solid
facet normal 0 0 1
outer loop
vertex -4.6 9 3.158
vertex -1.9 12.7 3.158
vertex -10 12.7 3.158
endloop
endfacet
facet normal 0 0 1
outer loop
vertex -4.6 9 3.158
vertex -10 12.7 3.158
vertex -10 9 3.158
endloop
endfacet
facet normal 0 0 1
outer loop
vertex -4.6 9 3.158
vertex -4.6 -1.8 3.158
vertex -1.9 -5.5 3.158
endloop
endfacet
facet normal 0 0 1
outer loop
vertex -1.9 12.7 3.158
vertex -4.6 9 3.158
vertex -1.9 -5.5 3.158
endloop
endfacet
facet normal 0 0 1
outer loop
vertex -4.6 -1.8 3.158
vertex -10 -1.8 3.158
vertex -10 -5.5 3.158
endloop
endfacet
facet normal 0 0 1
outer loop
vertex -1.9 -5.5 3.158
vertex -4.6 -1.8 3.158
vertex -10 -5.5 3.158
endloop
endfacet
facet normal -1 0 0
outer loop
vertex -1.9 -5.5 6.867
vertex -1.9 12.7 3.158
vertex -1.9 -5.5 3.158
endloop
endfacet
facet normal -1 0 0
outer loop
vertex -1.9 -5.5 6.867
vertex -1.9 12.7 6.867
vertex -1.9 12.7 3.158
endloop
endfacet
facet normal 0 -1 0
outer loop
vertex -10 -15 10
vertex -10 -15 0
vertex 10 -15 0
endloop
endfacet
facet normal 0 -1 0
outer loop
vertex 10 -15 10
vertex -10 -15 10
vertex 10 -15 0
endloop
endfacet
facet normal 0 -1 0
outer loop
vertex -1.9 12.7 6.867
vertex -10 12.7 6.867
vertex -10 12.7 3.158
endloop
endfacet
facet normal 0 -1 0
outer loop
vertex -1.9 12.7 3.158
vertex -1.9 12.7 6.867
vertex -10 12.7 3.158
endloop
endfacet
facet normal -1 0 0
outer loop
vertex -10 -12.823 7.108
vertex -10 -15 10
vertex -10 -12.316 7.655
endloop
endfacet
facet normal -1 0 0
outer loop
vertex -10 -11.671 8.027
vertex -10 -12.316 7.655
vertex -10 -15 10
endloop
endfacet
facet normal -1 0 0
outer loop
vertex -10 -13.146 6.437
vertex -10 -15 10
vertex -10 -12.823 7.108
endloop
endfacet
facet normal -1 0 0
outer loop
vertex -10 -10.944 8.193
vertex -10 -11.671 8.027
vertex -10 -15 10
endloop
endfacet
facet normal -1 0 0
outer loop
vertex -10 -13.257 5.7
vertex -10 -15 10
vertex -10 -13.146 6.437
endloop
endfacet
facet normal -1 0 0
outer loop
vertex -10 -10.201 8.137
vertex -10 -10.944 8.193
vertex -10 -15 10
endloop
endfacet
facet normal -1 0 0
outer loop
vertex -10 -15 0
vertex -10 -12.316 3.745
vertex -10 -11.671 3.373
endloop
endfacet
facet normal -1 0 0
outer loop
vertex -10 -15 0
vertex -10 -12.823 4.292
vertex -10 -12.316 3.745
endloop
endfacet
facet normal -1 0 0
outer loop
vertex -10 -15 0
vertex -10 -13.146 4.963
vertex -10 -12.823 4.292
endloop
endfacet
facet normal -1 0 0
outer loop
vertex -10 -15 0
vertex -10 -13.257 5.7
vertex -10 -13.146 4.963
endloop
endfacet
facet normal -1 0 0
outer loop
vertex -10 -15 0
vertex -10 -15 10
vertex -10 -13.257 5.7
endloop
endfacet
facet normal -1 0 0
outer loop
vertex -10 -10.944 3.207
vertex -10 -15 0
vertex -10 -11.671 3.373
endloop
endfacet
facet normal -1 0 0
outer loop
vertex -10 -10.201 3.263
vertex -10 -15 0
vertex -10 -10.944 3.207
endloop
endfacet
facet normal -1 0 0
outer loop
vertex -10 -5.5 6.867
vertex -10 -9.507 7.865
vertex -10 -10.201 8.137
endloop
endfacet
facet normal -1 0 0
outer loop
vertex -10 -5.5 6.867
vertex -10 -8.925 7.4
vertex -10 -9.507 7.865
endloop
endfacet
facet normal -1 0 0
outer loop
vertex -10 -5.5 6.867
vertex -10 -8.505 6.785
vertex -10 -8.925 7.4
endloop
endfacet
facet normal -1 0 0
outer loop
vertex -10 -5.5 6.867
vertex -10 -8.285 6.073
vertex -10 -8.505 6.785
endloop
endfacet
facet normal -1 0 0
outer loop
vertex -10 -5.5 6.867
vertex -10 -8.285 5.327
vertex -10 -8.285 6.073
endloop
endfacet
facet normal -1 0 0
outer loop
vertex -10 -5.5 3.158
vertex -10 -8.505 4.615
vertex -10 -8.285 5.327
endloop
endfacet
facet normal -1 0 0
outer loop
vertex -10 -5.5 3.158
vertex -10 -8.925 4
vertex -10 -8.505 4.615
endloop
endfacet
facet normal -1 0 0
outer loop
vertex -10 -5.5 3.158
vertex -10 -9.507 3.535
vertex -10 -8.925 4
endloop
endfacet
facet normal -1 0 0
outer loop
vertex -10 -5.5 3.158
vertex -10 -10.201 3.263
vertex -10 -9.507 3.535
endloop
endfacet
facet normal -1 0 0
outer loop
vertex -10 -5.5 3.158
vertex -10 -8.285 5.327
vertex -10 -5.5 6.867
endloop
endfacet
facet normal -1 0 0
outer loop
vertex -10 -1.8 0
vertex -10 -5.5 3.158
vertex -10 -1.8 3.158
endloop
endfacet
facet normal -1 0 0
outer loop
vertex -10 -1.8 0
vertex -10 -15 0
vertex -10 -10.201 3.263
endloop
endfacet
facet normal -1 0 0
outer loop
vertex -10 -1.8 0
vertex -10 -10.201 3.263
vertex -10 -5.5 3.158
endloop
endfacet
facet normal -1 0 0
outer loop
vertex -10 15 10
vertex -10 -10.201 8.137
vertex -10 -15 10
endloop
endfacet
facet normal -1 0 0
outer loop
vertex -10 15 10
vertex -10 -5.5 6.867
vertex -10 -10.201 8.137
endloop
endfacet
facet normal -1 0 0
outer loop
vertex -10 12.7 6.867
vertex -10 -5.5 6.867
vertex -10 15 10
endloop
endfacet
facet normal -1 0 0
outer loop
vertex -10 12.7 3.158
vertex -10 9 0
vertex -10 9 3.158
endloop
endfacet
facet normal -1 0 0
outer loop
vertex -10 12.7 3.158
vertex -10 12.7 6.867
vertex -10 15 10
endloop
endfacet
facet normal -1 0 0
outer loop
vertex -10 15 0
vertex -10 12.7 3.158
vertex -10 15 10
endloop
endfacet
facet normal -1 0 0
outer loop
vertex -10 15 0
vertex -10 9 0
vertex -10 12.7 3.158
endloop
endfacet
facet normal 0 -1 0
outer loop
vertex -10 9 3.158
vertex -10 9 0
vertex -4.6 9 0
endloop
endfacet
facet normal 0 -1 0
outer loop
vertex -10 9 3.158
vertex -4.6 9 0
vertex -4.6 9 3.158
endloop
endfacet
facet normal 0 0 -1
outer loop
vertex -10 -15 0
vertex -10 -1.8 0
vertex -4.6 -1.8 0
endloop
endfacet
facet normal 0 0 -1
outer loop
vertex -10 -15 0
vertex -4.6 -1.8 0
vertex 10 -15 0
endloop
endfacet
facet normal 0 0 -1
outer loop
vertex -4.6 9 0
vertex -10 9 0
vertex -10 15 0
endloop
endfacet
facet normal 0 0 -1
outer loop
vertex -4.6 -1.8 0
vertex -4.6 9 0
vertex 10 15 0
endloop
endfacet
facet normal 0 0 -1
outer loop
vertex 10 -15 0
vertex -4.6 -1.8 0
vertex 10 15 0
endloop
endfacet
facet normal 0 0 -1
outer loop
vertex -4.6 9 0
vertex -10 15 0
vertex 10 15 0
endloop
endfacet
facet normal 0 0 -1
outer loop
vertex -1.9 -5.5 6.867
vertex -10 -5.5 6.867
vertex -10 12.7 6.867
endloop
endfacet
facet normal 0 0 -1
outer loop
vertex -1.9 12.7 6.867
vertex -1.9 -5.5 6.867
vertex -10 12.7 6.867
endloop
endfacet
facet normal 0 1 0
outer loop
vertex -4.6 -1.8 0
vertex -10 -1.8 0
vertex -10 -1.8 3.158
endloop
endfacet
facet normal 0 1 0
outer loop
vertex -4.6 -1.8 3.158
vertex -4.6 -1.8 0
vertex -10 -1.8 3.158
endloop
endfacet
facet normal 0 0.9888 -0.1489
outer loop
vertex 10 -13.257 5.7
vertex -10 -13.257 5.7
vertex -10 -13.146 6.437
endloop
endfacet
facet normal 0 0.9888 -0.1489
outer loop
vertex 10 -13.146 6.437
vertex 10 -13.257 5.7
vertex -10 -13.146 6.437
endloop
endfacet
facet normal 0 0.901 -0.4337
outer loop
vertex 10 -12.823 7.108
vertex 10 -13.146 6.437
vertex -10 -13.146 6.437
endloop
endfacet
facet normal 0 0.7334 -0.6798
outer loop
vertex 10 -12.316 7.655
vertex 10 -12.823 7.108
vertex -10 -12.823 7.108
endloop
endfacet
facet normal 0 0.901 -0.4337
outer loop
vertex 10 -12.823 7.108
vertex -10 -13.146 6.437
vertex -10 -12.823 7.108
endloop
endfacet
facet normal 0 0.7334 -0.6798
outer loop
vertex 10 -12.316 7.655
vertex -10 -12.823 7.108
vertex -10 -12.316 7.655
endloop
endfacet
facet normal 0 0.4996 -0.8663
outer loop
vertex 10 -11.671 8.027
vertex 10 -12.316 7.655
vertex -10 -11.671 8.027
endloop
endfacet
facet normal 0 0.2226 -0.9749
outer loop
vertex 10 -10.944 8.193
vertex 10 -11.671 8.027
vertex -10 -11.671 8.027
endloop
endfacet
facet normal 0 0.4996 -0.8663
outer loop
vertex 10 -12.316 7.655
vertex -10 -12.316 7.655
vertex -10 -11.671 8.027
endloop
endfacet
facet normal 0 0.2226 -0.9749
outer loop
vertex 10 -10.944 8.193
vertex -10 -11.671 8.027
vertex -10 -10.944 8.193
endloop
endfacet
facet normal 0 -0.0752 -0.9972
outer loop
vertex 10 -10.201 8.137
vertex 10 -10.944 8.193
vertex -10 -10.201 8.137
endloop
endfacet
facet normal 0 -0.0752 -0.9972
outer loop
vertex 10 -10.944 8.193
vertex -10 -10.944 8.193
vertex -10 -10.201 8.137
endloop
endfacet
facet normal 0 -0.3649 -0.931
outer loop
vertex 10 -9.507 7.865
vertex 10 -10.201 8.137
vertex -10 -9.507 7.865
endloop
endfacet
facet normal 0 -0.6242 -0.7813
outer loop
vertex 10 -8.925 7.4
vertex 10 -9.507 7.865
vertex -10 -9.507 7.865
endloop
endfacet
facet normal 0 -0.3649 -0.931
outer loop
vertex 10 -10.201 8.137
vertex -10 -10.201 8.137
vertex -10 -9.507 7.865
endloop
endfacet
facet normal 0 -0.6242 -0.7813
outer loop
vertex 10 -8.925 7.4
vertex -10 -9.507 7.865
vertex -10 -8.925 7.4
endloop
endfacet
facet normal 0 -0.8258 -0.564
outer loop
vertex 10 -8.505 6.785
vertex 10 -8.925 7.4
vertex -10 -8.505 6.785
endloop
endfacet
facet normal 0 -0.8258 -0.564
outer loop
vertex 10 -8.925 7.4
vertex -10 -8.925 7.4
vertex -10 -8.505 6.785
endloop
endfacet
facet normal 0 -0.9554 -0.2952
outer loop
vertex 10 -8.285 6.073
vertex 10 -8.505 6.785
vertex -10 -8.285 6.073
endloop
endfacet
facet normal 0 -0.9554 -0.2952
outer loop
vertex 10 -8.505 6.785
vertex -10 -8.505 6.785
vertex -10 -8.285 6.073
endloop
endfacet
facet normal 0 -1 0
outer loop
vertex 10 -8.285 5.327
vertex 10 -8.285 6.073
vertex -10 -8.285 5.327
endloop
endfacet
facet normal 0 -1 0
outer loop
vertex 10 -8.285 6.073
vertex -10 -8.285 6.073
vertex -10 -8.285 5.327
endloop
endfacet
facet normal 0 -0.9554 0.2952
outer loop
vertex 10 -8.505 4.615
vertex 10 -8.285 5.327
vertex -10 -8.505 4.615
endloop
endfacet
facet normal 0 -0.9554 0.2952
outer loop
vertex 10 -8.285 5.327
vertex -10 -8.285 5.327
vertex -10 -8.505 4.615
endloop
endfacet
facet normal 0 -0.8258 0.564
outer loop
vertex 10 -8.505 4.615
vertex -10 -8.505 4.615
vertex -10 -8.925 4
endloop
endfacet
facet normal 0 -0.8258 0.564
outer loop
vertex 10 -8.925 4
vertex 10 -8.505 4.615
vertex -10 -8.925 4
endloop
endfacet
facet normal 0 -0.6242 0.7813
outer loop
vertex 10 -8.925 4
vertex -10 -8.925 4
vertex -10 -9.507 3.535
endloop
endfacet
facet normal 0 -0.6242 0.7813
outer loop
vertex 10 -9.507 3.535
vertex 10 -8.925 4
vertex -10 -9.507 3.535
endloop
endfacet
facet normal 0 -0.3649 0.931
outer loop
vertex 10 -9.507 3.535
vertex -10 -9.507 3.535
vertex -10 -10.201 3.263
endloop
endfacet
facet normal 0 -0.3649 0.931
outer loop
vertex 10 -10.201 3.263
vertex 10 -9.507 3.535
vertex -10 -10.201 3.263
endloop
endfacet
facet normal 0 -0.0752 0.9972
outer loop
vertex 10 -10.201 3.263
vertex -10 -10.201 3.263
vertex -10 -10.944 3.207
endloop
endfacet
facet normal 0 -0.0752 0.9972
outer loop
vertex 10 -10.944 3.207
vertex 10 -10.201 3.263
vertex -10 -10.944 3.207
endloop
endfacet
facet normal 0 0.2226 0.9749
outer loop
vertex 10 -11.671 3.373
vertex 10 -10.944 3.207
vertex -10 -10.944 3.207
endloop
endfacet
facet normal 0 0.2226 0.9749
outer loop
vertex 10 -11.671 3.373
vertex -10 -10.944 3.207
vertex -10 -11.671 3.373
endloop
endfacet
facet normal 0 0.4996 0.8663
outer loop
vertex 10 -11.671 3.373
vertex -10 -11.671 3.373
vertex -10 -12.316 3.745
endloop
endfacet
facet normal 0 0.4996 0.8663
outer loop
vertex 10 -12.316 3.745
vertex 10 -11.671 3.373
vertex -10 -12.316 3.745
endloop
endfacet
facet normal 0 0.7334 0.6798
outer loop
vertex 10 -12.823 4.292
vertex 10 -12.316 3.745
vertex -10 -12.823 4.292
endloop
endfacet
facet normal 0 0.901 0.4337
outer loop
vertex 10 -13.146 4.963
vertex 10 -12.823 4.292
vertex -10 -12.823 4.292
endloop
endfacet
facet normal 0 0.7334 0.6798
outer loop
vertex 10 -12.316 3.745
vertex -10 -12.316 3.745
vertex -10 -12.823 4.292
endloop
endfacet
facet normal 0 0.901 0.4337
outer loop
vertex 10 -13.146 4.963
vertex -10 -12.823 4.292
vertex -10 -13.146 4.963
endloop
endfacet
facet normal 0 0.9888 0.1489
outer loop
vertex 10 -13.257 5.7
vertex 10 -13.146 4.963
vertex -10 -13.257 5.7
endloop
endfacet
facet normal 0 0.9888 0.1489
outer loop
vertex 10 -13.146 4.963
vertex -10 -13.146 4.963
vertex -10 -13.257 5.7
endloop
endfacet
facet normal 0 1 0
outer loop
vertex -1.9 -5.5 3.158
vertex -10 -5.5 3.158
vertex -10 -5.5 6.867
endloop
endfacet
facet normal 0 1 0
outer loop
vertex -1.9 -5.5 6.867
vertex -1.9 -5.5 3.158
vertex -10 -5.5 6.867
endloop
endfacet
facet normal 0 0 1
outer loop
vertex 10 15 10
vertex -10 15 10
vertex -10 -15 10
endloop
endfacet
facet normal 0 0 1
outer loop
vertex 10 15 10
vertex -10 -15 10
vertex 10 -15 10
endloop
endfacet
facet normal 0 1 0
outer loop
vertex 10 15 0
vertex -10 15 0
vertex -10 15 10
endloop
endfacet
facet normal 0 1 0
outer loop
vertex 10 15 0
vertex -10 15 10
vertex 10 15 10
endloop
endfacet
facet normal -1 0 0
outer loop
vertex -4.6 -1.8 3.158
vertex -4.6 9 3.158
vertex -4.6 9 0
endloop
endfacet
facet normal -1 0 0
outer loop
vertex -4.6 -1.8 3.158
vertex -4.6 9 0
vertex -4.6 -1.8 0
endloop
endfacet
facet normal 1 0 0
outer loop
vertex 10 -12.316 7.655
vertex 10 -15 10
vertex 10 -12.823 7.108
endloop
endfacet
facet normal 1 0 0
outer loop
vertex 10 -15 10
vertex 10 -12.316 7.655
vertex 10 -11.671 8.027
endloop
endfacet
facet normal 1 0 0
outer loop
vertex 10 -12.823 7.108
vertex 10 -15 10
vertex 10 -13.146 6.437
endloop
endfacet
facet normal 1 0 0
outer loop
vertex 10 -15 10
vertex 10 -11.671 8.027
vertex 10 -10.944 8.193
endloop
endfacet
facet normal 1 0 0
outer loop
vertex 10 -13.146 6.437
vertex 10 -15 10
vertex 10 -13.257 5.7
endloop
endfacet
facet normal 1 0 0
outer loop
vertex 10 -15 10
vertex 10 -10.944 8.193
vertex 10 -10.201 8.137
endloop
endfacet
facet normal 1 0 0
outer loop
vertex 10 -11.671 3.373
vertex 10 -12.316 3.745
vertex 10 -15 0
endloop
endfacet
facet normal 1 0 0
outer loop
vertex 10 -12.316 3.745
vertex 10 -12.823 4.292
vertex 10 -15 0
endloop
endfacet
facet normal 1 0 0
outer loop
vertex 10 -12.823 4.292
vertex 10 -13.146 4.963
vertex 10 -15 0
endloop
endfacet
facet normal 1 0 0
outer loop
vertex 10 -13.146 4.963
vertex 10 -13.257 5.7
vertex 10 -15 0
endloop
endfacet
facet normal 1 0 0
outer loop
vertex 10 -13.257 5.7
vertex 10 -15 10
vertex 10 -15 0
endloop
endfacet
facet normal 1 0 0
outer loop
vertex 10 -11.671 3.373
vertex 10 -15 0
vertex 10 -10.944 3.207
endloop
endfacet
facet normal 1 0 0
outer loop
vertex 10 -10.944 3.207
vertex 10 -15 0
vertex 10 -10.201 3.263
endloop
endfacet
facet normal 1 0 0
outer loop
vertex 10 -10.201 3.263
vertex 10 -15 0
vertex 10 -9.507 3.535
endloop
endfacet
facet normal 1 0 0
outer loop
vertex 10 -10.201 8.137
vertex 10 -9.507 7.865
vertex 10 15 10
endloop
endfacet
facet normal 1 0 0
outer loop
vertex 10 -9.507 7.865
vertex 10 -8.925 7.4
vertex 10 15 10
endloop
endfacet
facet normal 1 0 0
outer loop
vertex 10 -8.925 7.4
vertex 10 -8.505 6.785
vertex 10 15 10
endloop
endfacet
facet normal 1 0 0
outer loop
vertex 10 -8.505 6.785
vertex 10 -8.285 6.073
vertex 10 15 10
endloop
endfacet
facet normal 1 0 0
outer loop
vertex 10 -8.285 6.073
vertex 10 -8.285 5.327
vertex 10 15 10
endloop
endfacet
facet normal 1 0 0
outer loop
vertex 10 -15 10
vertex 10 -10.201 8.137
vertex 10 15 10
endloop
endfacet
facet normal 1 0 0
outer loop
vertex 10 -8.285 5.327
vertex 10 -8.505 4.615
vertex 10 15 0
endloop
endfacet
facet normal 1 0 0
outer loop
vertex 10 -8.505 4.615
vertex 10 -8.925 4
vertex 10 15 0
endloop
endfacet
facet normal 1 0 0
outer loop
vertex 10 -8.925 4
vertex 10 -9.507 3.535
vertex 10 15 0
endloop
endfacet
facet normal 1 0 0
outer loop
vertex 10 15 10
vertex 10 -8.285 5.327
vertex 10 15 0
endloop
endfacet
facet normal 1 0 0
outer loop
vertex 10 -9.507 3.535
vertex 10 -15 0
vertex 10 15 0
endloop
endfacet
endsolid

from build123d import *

# Parameters (mm, degrees)
F0_W     = 20
F0_H     = 30
F1_DEPTH = 10
F2_W     = 10.8
F2_H     = 3.1583849106
F3_DEPTH = 5.4
F4_DEPTH = 8.1
F5_R     = 2.5
F6_DEPTH = 20


with BuildPart() as f1:
    # F0 (on Top) → F1 (new body)
    with BuildSketch(Plane.XY):
        Rectangle(F0_W, F0_H)
    extrude(amount=F1_DEPTH)

    # F2 (on face) → F3 (cut)
    with BuildSketch(Plane(origin=(-10, 0, 0), x_dir=(0, -1, 0), z_dir=(-1, 0, 0))):
        with Locations((-3.6, 1.5791924553)):
            Rectangle(F2_W, F2_H)
    extrude(amount=-F3_DEPTH, mode=Mode.SUBTRACT)

    # F2 (on face) → F4 (cut)
    with BuildSketch(Plane(origin=(-10, 0, 0), x_dir=(0, -1, 0), z_dir=(-1, 0, 0))):
        Polygon((-12.7, 3.1583849106), (-9, 3.1583849106), (1.8, 3.1583849106), (5.5, 3.1583849106), (5.5, 6.8666899811), (-12.7, 6.8666899811), align=None)
    extrude(amount=-F4_DEPTH, mode=Mode.SUBTRACT)

    # F5 (on face) → F6 (cut)
    with BuildSketch(Plane(origin=(-10, 0, 0), x_dir=(0, -1, 0), z_dir=(-1, 0, 0))):
        with Locations((10.7573593129, 5.7)):
            Circle(F5_R)
    extrude(amount=-F6_DEPTH, mode=Mode.SUBTRACT)


solid = f1.part
